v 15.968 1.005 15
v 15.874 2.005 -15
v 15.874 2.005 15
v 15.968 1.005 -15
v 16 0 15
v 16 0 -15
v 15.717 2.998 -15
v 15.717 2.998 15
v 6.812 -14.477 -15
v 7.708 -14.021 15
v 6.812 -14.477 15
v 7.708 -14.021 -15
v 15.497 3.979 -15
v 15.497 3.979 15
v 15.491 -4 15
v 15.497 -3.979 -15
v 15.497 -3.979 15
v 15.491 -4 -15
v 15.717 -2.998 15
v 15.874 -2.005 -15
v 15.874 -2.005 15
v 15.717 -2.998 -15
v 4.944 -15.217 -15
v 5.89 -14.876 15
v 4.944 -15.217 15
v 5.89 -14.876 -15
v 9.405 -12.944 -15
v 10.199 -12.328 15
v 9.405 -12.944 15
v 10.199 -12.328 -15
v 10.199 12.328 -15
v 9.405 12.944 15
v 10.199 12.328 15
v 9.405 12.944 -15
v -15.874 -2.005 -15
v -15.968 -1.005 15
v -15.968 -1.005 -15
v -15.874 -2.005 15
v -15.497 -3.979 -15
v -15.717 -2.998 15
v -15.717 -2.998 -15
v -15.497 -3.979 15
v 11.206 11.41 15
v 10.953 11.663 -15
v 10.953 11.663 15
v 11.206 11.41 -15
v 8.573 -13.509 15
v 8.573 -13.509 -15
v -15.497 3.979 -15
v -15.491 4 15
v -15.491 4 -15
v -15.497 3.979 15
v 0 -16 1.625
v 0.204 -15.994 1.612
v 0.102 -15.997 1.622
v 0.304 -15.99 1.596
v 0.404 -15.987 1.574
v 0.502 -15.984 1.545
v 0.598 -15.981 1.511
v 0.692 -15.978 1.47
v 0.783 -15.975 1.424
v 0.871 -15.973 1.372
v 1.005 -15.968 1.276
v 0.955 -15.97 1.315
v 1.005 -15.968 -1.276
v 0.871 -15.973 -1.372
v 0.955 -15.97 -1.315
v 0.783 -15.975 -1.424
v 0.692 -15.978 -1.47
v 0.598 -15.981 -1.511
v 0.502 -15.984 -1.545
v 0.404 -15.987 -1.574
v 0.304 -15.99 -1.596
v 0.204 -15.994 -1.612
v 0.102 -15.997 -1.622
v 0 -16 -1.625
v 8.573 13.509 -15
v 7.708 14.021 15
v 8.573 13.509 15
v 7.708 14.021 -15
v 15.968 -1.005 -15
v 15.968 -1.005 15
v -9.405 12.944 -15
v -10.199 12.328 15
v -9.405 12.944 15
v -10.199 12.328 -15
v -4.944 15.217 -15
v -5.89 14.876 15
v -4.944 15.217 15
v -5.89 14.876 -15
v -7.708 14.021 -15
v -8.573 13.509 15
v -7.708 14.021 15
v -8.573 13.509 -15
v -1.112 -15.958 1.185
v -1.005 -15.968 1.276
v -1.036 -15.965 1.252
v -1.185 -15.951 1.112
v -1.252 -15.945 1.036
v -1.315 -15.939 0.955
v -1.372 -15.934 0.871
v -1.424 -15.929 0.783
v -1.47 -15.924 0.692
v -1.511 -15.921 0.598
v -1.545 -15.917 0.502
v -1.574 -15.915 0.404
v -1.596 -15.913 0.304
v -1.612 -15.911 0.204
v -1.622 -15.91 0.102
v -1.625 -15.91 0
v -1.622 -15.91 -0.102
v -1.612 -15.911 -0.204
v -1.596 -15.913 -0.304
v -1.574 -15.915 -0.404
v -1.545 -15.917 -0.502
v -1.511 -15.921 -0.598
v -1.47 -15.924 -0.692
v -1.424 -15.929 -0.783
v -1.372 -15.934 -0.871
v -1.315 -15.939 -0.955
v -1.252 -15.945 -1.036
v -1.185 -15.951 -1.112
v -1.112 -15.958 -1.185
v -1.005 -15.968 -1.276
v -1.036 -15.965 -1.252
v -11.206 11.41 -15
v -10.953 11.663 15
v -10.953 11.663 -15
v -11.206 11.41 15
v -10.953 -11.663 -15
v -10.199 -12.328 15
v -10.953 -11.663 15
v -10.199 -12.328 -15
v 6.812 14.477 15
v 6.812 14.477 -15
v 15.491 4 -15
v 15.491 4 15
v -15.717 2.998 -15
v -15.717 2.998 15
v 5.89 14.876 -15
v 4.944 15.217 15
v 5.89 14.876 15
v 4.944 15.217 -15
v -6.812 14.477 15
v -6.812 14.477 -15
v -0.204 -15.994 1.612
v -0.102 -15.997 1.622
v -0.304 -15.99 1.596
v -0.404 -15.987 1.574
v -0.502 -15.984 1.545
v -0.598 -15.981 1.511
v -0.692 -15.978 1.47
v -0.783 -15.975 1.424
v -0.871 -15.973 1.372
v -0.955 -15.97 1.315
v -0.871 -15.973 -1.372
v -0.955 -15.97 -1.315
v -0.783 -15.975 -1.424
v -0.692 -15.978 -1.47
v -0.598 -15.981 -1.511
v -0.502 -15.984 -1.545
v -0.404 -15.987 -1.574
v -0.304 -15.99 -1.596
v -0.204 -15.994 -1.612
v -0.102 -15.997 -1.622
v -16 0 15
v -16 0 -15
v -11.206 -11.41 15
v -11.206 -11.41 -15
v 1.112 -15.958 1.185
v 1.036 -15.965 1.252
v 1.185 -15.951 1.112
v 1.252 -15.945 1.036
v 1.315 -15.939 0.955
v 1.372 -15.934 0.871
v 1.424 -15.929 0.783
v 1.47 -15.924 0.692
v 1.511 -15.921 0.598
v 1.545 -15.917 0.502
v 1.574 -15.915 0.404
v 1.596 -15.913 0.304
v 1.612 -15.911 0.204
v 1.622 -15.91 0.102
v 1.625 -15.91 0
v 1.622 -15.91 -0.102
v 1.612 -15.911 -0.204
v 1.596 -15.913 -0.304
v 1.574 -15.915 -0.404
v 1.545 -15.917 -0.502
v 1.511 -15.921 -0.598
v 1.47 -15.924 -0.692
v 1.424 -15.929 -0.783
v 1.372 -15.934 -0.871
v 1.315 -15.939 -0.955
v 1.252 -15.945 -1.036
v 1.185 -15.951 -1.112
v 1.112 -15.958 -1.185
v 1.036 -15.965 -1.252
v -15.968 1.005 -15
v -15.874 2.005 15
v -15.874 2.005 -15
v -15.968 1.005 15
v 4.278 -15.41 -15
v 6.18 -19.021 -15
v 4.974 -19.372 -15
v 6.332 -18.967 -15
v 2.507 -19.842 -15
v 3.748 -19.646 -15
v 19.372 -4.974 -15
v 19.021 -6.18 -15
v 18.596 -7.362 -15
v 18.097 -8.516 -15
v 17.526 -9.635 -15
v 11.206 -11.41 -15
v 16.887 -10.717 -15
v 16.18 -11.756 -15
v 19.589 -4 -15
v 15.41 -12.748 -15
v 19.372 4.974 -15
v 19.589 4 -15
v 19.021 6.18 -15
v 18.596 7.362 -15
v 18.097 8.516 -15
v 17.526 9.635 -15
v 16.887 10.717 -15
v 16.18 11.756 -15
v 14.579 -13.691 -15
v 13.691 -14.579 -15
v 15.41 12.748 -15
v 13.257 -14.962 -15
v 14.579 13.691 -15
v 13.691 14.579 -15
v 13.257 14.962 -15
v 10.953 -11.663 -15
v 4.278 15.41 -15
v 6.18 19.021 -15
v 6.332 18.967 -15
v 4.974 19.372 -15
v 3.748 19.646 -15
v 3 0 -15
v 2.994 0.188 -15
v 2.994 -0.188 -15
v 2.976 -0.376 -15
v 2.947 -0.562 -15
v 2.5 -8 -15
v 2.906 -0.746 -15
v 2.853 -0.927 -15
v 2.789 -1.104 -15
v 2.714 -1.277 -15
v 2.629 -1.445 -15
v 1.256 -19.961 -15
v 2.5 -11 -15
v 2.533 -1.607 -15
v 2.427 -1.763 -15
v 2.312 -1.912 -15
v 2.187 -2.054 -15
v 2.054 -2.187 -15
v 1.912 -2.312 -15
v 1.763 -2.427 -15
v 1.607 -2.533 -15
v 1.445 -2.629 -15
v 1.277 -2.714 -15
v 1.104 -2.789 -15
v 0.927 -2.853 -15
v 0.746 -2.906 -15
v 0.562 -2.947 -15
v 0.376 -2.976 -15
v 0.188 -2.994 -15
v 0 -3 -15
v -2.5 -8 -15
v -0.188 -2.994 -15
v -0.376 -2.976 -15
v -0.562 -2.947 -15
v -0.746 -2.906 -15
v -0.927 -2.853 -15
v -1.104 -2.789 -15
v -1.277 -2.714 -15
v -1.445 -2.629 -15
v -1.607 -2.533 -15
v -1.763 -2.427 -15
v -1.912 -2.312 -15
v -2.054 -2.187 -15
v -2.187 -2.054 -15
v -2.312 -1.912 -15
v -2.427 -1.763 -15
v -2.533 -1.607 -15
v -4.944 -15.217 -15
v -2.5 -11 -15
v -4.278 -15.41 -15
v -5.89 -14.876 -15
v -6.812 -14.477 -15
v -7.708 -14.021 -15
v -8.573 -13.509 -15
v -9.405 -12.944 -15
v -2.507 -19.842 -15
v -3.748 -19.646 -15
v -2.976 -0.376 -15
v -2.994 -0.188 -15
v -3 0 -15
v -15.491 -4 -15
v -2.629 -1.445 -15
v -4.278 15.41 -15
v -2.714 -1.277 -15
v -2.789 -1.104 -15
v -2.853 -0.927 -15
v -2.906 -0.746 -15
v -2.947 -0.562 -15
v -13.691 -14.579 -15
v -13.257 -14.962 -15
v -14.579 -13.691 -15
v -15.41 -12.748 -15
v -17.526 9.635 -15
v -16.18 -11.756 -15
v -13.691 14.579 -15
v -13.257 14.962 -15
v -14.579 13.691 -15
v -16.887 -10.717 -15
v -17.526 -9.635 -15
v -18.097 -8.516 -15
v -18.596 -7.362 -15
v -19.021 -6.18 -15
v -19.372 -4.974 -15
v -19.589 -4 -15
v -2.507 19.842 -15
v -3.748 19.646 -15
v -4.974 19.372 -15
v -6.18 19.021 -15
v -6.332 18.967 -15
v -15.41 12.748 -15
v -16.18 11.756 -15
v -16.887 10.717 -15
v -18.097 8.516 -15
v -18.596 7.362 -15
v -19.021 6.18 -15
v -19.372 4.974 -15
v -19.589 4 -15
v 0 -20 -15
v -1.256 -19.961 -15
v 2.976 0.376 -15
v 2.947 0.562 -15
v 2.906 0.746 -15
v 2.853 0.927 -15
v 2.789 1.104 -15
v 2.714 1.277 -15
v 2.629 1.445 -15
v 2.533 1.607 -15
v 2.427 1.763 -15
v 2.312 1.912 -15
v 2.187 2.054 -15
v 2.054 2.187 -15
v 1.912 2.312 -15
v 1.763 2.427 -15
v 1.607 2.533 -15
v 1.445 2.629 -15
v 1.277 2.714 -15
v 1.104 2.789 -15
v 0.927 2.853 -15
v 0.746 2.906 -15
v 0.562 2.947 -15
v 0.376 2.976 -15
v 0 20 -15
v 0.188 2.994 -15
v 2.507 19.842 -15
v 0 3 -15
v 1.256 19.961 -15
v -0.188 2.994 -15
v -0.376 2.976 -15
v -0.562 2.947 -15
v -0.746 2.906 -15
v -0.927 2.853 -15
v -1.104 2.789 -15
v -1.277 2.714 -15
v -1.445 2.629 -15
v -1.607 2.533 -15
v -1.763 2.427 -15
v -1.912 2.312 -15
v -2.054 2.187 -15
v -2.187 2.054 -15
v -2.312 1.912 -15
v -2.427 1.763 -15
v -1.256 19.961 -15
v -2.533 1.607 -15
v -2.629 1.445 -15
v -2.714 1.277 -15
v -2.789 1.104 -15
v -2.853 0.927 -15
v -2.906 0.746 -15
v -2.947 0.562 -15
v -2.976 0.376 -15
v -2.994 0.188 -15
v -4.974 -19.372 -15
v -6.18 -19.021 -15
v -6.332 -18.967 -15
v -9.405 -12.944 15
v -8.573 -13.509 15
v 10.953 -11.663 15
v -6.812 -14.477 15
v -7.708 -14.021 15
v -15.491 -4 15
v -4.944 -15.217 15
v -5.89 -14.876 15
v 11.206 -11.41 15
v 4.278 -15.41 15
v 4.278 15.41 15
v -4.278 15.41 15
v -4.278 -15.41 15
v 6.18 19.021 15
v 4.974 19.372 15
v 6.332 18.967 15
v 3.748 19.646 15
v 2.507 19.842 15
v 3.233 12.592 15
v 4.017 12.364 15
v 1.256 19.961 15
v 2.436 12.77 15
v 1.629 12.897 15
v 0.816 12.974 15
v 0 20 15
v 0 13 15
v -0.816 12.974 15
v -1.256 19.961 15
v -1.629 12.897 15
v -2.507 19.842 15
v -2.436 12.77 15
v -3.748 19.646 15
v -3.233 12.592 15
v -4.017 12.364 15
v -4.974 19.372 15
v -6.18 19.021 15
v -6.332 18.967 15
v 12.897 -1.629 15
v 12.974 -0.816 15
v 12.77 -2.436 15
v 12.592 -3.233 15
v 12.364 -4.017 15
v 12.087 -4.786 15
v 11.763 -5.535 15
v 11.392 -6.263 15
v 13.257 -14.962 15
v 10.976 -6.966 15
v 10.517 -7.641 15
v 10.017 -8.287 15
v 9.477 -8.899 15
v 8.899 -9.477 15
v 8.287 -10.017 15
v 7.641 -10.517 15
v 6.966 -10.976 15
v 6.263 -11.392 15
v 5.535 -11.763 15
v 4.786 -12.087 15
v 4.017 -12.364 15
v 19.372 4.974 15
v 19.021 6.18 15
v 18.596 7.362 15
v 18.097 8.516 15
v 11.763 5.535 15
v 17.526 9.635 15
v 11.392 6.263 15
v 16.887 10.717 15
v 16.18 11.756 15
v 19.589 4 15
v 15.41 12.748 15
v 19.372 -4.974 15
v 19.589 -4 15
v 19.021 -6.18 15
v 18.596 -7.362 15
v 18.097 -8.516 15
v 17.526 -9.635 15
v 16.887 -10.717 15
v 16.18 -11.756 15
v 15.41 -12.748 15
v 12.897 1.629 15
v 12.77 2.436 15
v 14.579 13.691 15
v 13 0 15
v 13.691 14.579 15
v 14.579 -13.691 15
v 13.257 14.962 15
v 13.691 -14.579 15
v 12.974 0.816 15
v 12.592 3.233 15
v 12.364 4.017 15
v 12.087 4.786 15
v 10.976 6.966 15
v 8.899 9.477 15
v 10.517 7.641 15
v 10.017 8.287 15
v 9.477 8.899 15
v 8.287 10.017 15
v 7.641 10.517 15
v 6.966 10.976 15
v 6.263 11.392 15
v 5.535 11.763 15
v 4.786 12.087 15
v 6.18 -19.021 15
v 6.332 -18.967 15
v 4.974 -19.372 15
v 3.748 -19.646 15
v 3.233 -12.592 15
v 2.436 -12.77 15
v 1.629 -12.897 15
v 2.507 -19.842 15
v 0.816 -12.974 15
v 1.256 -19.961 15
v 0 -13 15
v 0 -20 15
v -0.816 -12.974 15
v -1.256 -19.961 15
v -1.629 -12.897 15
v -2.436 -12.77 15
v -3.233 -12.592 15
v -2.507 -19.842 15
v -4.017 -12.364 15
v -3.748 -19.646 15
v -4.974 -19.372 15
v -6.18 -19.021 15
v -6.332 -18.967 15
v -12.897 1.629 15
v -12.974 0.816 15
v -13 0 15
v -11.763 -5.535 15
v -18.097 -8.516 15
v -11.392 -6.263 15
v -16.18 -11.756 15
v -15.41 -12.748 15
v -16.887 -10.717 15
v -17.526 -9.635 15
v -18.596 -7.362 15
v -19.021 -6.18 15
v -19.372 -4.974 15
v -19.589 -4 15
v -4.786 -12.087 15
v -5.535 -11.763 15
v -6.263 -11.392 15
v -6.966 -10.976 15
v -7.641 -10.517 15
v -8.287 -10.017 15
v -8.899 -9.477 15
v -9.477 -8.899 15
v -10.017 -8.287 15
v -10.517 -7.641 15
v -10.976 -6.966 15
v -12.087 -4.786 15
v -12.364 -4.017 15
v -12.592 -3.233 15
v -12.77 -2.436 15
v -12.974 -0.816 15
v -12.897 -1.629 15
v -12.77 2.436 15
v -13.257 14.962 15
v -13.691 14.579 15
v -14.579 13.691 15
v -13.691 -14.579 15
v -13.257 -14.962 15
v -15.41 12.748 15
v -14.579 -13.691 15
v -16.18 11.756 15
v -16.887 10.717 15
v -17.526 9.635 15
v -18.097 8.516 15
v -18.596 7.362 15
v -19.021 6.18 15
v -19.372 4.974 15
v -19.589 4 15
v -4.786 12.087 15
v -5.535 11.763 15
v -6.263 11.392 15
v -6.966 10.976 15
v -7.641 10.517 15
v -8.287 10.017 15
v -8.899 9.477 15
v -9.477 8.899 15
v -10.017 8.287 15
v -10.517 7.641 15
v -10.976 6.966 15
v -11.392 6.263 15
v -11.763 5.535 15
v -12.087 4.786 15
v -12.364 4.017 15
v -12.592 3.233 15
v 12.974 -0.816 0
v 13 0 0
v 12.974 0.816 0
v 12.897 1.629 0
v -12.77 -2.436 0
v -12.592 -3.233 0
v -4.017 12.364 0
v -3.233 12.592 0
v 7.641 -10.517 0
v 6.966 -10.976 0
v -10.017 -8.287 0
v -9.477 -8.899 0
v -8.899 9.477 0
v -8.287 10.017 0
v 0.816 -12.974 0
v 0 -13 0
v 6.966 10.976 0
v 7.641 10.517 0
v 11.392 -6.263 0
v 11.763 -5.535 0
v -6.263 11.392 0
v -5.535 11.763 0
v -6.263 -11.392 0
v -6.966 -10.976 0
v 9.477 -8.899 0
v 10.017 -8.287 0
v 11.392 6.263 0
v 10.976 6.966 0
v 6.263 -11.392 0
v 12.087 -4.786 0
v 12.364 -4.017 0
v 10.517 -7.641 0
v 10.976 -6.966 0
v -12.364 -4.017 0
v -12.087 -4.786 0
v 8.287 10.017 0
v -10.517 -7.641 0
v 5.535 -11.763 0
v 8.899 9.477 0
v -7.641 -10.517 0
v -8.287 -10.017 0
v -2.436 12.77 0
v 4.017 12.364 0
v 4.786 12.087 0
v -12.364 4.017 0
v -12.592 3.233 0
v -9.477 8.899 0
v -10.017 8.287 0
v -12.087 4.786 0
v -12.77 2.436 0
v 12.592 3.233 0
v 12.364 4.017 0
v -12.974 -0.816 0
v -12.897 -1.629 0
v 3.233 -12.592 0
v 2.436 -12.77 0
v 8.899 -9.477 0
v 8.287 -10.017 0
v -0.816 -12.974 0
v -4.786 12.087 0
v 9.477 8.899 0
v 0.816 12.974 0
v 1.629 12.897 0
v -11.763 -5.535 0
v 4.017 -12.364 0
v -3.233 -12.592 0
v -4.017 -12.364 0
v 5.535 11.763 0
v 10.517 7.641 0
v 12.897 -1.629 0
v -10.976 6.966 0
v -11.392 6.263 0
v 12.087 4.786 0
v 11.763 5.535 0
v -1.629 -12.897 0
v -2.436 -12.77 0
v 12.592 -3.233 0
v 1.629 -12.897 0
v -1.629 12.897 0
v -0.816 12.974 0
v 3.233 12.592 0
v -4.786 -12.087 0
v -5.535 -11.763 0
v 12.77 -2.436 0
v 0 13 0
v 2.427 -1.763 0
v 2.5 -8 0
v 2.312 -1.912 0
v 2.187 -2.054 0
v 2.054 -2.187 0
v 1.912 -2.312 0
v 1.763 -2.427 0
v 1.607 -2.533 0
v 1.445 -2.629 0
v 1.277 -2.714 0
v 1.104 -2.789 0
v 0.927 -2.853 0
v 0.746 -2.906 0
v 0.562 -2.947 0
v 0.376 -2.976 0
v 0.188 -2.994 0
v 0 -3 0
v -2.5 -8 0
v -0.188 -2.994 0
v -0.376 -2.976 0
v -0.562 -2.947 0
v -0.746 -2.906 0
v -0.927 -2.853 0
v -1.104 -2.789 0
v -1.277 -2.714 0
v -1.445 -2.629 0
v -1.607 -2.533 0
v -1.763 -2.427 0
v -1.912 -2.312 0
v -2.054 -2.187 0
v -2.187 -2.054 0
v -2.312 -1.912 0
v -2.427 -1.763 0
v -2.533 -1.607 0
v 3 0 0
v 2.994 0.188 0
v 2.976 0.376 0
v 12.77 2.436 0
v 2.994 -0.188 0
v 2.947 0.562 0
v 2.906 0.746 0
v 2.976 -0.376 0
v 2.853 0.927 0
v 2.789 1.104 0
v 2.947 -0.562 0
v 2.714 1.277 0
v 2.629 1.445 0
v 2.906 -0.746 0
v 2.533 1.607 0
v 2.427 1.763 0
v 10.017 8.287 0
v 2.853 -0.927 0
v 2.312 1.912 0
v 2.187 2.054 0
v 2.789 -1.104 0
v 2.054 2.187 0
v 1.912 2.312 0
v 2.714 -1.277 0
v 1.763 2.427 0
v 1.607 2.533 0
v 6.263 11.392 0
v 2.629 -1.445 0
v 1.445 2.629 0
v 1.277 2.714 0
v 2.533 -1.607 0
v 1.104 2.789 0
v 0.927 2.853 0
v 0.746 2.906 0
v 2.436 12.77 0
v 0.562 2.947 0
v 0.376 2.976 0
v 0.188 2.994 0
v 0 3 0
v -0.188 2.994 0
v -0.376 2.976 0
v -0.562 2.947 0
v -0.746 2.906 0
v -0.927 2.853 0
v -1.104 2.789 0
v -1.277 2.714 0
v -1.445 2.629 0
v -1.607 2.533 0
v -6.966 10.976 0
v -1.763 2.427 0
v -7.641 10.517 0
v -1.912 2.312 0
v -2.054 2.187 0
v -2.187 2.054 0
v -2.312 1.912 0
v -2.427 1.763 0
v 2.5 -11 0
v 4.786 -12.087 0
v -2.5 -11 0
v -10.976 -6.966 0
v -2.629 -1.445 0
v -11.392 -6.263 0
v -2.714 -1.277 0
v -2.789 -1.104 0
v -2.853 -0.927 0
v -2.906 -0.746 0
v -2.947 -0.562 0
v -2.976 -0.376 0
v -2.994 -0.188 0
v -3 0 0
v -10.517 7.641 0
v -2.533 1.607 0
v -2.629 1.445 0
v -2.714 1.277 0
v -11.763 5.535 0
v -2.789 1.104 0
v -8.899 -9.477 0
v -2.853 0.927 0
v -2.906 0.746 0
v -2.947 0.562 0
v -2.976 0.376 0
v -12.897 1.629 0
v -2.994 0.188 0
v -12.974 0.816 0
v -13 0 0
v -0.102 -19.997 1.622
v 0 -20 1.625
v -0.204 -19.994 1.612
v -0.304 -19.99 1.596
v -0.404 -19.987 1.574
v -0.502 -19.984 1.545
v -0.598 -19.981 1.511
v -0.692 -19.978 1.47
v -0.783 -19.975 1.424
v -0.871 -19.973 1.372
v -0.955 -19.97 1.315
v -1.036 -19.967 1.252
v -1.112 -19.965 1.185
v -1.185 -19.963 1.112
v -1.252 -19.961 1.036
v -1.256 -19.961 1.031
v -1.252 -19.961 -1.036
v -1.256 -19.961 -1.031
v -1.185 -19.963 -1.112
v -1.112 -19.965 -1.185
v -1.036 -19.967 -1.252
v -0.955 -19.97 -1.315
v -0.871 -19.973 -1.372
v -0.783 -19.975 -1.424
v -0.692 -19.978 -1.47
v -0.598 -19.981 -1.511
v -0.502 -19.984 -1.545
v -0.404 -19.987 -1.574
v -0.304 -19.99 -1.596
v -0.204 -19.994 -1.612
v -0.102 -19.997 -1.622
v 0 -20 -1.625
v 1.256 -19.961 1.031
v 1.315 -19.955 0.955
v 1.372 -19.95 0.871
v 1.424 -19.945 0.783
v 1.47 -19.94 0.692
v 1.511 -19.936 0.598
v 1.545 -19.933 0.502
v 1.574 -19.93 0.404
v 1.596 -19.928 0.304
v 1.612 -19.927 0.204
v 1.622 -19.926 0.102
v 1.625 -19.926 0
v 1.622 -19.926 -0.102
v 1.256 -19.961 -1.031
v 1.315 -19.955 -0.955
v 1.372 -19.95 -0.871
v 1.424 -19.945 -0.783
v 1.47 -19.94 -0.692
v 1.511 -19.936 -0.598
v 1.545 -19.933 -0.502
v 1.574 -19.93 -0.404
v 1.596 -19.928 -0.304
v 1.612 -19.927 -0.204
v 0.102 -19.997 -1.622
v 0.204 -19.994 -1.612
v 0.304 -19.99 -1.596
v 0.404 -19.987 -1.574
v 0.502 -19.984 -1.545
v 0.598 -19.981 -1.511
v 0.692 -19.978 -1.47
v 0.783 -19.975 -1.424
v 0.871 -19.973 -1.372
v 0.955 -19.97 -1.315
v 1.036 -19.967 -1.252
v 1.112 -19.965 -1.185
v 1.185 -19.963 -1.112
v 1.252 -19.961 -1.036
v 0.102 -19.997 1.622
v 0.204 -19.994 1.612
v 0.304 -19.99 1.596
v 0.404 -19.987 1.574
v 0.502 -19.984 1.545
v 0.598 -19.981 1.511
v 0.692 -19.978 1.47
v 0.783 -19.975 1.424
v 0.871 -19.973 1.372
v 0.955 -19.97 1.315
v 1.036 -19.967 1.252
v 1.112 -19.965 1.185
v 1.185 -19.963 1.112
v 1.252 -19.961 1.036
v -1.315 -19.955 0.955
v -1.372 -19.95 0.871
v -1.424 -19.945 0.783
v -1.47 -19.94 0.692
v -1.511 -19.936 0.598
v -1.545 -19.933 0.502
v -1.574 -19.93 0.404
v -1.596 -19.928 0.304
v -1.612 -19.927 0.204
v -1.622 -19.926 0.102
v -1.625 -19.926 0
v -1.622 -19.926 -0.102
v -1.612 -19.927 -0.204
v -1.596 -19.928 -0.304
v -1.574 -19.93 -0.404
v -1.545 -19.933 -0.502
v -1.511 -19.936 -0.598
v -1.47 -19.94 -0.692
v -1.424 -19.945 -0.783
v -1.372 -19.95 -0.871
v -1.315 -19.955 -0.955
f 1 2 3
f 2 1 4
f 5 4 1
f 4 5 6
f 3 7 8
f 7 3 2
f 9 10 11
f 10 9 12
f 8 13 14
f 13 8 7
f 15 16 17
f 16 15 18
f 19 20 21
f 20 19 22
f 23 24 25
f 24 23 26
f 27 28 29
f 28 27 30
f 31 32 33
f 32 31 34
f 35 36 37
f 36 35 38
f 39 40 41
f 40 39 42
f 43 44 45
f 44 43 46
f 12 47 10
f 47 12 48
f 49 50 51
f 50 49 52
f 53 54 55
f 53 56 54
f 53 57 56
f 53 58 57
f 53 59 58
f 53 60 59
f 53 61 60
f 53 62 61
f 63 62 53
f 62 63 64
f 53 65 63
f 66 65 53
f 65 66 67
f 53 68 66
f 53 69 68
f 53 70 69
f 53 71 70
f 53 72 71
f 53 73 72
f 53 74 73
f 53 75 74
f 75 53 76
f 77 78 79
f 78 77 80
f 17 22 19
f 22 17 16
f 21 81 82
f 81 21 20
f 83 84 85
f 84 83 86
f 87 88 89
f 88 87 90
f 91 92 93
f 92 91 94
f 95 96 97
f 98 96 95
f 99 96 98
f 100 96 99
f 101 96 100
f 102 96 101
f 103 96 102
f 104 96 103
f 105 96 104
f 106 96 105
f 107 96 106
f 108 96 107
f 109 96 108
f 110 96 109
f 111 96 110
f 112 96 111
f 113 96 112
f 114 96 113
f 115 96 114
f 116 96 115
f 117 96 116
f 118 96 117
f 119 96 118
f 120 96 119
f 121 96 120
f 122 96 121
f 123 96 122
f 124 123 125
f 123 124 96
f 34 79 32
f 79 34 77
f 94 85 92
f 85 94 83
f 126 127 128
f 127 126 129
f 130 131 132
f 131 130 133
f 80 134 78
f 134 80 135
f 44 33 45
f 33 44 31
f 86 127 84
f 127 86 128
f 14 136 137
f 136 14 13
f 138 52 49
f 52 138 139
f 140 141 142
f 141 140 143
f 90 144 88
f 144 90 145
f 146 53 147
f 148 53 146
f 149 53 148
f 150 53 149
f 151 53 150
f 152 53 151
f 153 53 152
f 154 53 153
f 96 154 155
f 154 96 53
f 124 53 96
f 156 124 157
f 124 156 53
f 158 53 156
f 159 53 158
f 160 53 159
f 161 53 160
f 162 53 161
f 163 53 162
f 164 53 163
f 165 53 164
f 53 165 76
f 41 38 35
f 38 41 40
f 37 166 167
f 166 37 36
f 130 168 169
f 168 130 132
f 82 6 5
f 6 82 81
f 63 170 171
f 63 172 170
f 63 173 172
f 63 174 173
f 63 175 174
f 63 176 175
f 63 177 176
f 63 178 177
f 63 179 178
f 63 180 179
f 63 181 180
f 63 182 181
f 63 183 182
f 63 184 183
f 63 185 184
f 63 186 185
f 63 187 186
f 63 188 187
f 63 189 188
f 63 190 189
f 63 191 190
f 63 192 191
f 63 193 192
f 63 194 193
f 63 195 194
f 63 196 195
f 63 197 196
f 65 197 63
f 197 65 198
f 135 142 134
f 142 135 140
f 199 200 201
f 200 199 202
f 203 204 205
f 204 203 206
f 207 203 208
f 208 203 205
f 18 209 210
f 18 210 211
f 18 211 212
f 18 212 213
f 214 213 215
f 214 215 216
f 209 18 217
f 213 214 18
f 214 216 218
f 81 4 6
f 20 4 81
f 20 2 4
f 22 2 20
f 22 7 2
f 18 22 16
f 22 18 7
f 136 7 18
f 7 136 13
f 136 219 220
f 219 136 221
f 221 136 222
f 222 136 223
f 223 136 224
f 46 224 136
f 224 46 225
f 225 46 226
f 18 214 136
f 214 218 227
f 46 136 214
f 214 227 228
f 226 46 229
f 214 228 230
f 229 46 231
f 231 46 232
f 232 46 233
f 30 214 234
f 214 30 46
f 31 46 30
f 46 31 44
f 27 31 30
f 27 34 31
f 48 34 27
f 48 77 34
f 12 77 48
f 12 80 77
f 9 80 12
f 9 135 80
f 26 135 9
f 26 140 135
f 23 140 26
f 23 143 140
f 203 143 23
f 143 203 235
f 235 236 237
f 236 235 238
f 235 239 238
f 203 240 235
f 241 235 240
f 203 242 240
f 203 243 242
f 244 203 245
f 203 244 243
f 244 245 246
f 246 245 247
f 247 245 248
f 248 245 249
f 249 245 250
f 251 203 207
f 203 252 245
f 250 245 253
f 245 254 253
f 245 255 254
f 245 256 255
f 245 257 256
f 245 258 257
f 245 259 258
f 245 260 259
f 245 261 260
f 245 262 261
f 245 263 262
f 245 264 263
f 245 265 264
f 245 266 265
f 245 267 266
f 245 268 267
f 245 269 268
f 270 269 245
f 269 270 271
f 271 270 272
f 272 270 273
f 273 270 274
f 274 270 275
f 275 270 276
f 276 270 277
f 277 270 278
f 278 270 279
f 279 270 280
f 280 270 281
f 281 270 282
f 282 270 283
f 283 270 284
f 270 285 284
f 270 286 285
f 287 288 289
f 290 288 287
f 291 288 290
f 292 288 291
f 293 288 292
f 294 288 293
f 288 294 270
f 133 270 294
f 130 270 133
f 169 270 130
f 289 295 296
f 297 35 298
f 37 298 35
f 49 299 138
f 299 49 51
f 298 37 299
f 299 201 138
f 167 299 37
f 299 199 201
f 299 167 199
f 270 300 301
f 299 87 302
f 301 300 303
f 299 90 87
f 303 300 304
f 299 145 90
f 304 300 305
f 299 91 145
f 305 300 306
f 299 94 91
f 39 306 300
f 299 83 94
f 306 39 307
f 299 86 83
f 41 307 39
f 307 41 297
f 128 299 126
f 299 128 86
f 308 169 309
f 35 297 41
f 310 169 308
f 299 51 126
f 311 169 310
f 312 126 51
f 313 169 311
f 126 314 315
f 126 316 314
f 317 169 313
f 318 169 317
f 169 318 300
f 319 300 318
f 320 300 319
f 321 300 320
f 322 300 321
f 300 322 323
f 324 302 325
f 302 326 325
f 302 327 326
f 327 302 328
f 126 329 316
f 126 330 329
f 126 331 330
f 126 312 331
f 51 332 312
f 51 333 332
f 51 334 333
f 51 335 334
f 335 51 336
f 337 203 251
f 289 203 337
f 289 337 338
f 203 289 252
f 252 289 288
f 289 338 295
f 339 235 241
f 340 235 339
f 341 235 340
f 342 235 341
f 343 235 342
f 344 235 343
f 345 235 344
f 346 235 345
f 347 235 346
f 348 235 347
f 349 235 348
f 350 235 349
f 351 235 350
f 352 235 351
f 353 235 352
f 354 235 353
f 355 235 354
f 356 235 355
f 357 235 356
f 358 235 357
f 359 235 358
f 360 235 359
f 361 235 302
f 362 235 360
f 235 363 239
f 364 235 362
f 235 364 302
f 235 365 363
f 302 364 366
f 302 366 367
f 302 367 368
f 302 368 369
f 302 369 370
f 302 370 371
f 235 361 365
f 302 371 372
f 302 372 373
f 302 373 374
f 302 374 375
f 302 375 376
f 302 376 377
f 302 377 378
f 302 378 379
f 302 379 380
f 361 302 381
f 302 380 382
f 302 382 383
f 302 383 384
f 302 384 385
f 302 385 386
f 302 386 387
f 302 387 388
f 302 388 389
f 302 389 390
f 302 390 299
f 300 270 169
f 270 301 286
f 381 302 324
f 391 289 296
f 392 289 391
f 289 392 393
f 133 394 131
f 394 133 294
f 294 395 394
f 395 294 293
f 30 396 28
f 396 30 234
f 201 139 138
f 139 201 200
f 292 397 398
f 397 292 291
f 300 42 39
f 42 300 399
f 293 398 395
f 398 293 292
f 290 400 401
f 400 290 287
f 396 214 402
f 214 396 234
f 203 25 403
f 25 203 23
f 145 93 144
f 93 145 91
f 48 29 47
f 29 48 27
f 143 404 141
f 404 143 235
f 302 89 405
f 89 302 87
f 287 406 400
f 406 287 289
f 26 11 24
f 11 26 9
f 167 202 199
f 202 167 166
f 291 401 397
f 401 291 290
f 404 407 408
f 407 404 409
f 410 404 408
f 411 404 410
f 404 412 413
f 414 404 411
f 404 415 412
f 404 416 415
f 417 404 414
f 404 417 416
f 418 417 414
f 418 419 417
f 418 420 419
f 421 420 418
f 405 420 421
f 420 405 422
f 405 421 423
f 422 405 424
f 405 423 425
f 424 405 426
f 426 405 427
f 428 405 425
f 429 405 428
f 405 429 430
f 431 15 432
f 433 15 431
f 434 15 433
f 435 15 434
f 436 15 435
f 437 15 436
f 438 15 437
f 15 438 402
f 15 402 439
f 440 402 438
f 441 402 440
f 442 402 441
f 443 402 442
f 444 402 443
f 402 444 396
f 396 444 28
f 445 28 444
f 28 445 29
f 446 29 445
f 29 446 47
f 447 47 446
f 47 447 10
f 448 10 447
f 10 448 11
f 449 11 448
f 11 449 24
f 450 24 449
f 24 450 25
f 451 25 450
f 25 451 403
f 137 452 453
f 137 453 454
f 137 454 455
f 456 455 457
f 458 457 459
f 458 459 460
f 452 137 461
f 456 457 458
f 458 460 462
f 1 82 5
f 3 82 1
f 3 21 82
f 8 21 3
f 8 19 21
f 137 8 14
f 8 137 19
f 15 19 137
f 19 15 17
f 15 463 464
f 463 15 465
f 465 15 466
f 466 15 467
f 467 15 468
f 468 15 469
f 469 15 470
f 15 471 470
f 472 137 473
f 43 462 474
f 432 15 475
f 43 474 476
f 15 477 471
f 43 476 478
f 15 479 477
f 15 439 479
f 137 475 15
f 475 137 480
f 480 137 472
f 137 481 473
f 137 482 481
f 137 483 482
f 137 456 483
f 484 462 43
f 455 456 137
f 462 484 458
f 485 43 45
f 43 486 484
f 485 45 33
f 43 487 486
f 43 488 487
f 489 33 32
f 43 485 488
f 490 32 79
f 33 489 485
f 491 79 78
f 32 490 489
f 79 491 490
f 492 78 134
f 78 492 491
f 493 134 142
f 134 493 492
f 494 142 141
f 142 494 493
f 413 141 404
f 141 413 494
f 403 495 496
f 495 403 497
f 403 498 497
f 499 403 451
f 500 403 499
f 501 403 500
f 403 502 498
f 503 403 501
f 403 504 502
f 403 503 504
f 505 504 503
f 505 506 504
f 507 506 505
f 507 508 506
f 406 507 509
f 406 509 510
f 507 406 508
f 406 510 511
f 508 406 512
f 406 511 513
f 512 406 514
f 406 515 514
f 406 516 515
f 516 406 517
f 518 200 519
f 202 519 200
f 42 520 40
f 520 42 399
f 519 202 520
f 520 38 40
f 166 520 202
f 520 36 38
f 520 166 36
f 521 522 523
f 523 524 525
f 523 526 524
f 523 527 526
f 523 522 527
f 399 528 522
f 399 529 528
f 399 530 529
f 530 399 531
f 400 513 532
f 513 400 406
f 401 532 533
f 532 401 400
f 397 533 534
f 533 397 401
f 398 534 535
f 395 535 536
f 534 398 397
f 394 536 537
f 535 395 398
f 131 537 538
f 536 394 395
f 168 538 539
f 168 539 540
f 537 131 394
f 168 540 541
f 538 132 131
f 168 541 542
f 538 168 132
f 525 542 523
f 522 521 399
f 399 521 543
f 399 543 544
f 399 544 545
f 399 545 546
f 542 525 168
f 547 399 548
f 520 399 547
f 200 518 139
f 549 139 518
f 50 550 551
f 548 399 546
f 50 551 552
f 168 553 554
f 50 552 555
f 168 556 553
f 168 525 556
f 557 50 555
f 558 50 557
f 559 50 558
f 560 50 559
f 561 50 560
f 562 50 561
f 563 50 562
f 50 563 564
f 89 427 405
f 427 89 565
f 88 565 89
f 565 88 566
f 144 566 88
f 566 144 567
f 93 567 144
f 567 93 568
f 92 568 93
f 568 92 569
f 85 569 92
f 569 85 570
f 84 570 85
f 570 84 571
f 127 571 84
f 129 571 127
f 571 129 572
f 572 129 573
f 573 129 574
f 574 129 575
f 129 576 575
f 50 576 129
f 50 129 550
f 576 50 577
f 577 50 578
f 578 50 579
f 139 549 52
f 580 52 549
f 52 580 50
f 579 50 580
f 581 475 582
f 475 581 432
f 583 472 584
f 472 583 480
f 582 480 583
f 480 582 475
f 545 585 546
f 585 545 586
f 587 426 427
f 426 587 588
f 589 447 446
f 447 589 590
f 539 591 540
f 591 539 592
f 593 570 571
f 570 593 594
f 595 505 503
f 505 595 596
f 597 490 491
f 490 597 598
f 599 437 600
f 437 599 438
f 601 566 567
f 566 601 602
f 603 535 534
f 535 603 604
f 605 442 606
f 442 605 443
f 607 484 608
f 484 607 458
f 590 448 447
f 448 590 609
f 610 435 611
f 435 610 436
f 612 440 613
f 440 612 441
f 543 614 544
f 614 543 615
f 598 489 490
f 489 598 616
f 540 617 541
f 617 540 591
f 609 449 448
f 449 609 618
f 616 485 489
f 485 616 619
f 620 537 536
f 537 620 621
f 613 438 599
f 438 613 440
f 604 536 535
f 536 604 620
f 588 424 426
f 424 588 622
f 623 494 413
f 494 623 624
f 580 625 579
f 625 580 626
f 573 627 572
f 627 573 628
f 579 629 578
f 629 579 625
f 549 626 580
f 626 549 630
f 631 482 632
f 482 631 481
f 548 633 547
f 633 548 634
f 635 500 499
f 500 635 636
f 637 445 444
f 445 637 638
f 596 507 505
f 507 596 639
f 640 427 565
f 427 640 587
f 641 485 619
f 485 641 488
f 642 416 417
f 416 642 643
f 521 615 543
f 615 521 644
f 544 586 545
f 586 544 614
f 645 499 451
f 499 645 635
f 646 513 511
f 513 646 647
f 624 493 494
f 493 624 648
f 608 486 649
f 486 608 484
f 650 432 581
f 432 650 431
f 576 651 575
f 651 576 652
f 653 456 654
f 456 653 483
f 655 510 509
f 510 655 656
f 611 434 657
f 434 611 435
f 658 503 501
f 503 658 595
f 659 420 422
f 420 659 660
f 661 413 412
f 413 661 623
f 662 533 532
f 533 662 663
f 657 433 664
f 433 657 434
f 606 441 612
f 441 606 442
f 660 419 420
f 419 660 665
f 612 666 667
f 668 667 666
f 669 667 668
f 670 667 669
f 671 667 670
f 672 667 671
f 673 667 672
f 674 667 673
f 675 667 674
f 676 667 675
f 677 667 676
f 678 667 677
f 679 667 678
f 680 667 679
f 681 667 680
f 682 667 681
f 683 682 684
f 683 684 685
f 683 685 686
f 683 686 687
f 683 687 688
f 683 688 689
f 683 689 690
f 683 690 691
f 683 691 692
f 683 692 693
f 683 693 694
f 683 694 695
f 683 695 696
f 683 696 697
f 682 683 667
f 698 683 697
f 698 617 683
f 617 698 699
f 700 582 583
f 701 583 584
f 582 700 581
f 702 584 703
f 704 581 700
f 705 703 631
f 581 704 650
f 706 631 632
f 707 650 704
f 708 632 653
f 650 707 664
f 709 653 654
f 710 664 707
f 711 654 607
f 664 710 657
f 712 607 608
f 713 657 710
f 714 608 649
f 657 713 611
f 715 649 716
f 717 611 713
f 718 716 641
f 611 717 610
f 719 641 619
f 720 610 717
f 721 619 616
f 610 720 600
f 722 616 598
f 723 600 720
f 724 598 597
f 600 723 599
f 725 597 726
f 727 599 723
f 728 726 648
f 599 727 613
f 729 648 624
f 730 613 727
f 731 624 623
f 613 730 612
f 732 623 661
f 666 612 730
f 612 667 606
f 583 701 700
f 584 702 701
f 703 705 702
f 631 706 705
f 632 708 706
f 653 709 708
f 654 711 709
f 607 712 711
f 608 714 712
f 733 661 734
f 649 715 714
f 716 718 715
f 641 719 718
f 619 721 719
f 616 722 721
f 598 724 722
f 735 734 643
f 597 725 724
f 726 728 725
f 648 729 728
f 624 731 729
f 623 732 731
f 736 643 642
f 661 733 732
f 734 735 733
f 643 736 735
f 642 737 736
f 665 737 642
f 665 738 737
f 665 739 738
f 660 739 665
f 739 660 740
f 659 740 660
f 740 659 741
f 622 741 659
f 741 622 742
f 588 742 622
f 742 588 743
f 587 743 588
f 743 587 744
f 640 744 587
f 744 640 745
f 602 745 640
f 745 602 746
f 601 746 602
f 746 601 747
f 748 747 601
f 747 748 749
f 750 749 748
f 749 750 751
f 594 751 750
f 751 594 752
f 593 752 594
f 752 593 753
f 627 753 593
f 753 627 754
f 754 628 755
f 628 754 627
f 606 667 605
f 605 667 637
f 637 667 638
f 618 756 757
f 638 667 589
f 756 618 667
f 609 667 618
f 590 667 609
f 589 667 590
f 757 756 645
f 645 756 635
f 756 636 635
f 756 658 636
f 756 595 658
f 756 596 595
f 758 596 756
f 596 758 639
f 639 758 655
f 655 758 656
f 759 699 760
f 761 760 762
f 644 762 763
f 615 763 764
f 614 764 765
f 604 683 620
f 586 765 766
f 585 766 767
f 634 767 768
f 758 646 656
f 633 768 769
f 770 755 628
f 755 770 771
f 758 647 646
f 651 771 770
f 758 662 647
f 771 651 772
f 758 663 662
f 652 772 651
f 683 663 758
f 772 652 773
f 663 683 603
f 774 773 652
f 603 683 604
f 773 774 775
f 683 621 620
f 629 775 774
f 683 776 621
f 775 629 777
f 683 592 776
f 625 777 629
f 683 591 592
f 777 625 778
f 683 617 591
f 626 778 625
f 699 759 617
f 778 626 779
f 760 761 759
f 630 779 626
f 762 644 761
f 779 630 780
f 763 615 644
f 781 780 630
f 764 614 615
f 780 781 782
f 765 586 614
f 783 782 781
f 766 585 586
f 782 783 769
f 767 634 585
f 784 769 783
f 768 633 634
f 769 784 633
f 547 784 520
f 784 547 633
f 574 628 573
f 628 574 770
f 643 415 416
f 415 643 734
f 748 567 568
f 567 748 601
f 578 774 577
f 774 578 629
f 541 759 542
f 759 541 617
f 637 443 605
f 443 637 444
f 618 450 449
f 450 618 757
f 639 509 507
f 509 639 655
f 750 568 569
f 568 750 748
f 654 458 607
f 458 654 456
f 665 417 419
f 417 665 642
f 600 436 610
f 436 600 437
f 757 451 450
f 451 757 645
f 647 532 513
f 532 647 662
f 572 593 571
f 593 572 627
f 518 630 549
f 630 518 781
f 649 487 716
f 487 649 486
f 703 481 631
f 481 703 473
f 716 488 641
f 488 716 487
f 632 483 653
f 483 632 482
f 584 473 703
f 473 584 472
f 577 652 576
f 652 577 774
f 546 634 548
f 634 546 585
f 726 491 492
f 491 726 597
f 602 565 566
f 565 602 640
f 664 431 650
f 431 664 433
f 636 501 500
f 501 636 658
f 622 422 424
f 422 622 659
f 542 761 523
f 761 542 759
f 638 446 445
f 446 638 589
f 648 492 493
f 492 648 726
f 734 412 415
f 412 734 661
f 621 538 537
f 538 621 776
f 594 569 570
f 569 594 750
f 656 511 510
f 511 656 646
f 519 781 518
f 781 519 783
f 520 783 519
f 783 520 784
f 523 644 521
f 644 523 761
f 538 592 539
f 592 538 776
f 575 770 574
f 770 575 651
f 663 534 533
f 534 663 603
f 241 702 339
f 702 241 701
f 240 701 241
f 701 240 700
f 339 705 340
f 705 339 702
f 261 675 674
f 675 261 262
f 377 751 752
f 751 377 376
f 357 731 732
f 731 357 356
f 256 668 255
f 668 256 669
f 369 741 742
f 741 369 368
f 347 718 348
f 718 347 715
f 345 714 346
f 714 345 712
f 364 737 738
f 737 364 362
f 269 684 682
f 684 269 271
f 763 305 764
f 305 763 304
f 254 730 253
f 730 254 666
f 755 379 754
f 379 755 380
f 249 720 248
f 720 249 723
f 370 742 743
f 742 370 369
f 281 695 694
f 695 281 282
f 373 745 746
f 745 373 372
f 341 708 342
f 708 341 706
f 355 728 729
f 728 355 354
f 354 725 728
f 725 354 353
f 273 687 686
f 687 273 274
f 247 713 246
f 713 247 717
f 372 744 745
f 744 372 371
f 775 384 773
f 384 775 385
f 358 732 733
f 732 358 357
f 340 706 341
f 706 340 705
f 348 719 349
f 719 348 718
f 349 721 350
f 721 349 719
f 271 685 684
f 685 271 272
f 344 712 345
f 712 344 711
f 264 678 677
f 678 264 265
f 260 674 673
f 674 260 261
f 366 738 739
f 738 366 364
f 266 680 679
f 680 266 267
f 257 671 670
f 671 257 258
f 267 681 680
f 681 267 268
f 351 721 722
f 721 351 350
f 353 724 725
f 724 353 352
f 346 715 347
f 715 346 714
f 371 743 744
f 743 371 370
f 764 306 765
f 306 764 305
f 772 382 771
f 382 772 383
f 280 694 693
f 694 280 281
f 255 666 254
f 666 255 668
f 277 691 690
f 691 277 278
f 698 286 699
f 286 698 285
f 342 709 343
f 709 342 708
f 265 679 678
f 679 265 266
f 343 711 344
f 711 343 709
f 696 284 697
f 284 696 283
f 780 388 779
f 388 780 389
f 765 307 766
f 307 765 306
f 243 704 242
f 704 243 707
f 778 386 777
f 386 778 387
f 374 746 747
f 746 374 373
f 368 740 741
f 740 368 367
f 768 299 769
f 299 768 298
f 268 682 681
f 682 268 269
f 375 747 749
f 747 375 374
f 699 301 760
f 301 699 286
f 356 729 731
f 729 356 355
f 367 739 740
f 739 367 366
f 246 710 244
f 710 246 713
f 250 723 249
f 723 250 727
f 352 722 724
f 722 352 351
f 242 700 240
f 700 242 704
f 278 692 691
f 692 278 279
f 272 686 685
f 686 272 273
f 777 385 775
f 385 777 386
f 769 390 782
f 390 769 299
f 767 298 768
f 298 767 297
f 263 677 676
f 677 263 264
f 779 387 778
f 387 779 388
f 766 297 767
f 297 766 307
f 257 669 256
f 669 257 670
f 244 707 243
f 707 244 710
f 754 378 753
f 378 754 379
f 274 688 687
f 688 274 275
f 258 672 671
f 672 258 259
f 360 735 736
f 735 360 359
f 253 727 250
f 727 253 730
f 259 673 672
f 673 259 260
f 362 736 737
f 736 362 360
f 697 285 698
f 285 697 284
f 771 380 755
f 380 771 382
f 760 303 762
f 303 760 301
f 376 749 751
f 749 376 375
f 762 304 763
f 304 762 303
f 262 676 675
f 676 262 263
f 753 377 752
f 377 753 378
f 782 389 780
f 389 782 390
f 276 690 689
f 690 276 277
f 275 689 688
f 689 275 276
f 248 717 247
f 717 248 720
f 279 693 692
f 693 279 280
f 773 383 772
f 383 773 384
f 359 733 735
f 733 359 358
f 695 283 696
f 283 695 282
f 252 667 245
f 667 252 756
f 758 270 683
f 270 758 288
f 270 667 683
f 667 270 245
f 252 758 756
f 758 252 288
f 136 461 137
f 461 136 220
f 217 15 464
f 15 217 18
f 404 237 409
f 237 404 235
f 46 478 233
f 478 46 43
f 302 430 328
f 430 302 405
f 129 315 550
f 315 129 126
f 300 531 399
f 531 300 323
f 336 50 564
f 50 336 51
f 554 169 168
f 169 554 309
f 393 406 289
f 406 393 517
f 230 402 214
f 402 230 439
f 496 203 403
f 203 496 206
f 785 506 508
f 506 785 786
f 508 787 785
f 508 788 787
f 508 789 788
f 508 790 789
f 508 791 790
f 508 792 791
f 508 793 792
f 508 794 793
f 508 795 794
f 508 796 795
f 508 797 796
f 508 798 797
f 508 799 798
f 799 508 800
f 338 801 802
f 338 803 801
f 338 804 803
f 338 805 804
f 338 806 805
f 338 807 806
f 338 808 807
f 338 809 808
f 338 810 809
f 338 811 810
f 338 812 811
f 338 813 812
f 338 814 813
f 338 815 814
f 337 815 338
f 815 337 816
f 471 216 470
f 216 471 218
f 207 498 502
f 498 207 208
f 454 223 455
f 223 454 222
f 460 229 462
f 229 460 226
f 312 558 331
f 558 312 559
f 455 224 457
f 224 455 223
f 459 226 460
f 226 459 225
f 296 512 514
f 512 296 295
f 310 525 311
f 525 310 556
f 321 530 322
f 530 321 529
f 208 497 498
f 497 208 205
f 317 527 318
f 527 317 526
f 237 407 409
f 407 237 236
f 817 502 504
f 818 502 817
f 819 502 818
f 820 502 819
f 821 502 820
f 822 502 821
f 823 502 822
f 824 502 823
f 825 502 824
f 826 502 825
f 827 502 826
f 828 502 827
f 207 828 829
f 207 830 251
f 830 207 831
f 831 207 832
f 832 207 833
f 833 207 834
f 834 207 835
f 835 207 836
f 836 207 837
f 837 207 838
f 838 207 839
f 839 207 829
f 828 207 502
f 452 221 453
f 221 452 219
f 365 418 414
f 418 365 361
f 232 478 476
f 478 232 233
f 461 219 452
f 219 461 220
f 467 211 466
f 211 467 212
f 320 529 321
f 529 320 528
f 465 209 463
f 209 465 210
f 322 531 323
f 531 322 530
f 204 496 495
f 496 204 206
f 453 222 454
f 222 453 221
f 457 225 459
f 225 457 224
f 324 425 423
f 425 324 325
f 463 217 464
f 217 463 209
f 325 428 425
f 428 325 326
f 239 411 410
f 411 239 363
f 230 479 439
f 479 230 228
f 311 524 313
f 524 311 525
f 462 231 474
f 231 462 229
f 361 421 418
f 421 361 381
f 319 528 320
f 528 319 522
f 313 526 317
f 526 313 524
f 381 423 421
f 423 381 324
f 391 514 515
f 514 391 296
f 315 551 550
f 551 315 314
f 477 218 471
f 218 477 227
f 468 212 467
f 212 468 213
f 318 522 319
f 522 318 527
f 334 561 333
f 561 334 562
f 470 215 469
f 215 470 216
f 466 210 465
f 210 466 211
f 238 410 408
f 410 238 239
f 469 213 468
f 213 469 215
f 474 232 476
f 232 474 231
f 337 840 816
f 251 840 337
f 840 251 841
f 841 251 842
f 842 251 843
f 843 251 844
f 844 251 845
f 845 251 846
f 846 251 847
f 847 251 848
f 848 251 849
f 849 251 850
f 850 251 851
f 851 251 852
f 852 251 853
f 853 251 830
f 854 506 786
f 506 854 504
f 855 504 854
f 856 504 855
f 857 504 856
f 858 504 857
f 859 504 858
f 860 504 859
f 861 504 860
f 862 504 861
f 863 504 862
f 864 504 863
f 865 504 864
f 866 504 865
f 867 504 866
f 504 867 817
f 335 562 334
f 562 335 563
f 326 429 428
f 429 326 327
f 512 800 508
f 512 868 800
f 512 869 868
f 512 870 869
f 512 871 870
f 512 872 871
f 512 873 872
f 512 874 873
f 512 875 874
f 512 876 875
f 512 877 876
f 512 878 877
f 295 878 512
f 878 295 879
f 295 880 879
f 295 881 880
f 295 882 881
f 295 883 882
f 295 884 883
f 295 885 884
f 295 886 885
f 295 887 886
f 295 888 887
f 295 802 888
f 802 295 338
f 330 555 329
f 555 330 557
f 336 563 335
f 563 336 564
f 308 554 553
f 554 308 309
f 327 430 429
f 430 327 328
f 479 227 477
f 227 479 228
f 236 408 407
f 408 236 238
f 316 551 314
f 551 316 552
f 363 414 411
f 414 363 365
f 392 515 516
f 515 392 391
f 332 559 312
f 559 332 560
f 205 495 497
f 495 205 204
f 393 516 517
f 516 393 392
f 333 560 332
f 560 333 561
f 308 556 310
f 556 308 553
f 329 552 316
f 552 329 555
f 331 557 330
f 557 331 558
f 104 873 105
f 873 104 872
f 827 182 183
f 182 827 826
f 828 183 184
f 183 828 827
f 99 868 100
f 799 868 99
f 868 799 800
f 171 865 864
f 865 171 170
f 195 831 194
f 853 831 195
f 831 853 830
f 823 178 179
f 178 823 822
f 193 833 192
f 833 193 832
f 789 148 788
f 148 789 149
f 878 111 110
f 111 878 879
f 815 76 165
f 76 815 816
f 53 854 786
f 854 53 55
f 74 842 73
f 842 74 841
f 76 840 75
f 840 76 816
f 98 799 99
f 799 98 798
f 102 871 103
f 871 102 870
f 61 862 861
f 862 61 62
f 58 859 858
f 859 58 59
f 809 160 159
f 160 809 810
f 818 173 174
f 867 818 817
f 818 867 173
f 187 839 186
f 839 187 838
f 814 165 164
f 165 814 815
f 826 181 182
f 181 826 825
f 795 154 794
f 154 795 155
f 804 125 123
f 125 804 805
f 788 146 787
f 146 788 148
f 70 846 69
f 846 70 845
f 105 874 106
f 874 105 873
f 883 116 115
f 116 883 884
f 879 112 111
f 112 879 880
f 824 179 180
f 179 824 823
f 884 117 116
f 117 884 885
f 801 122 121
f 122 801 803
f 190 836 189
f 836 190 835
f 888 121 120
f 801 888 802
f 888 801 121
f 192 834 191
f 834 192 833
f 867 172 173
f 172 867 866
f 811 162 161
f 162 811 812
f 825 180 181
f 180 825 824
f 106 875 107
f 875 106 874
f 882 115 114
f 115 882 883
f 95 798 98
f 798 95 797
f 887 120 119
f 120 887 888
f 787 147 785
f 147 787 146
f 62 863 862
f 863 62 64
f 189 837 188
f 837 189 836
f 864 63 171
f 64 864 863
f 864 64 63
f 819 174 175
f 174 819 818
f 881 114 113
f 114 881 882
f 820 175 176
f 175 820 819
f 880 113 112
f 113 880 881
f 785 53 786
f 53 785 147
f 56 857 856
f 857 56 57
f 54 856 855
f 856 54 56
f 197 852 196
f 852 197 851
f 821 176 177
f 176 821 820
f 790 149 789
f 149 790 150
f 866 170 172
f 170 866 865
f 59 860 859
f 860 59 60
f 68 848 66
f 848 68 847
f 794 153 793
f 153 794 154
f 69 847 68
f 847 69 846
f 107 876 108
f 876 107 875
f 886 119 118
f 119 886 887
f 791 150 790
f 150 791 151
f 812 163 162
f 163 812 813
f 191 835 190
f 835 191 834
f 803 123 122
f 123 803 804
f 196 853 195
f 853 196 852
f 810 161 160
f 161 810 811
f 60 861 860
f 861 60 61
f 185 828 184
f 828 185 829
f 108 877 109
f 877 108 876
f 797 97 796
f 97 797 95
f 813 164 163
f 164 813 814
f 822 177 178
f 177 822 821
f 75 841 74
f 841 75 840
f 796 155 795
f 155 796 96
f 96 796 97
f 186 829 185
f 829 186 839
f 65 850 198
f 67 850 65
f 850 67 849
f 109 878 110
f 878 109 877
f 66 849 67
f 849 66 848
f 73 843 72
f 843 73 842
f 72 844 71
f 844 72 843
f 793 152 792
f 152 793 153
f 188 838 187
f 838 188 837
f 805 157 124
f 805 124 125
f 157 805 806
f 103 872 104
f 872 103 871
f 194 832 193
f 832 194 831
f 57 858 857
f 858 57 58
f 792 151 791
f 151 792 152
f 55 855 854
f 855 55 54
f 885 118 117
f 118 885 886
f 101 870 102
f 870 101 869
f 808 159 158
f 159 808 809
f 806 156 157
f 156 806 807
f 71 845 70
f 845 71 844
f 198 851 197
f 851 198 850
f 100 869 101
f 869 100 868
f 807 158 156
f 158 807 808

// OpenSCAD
// Dimensiones de los chaveteros
ancho_x=15;     // Mucho mayor a la diferencia de los radio interno y externo
largo_y=8;
alto_z=30;

// Dimensiones de la llanta
radio_externo_llanta=20;
radio_interno_llanta=radio_externo_llanta-4;
alto_llanta=alto_z;

// Dimension del eje del motor
diametro_eje=6;

// Prisionero
diametro_prisionero=3.25;

// Tuerca
tuerca_x=5;
tuerca_y=3;
pos_tuerca=(radio_interno_llanta-diametro_eje/2)/2+diametro_eje/2;


union(){

difference(){
// Llanta interna
cylinder(h=alto_llanta, r=radio_interno_llanta,$fn=100,center=true);

// Hueco interior   
cylinder(h=alto_llanta/2, r=radio_interno_llanta-3,$fn=100,center=false);

// Agujero del eje
cylinder(h=alto_llanta, r=diametro_eje/2,$fn=100,center=true);
    

// Agujero de la tuerca
translate([0,-pos_tuerca,0])
cube([tuerca_x,tuerca_y,alto_z], center=true);    

}



difference(){

// Llanta externa
cylinder(h=alto_llanta, r=radio_externo_llanta,$fn=100,center=true);

// Hueco interior   
cylinder(h=alto_llanta/2, r=radio_interno_llanta-3,$fn=100,center=false);

// Agujero del eje
cylinder(h=alto_llanta, r=diametro_eje/2,$fn=100,center=true);

   
// Hueco de los chaveteros
for ( i = [0 : 60 : 300] )
{
translate([radio_externo_llanta*cos(i),radio_externo_llanta*sin(i),0])
rotate(i)
cube([ancho_x,largo_y,alto_z], center=true);
}

// Agujero de la tuerca
translate([0,-pos_tuerca,0])
cube([tuerca_x,tuerca_y,alto_z], center=true);    

// Agujero del prisionero
translate([0,0,0])
rotate([90,0,0])
cylinder(h=radio_externo_llanta, r=diametro_prisionero/2,$fn=100,center=false);
}

}
